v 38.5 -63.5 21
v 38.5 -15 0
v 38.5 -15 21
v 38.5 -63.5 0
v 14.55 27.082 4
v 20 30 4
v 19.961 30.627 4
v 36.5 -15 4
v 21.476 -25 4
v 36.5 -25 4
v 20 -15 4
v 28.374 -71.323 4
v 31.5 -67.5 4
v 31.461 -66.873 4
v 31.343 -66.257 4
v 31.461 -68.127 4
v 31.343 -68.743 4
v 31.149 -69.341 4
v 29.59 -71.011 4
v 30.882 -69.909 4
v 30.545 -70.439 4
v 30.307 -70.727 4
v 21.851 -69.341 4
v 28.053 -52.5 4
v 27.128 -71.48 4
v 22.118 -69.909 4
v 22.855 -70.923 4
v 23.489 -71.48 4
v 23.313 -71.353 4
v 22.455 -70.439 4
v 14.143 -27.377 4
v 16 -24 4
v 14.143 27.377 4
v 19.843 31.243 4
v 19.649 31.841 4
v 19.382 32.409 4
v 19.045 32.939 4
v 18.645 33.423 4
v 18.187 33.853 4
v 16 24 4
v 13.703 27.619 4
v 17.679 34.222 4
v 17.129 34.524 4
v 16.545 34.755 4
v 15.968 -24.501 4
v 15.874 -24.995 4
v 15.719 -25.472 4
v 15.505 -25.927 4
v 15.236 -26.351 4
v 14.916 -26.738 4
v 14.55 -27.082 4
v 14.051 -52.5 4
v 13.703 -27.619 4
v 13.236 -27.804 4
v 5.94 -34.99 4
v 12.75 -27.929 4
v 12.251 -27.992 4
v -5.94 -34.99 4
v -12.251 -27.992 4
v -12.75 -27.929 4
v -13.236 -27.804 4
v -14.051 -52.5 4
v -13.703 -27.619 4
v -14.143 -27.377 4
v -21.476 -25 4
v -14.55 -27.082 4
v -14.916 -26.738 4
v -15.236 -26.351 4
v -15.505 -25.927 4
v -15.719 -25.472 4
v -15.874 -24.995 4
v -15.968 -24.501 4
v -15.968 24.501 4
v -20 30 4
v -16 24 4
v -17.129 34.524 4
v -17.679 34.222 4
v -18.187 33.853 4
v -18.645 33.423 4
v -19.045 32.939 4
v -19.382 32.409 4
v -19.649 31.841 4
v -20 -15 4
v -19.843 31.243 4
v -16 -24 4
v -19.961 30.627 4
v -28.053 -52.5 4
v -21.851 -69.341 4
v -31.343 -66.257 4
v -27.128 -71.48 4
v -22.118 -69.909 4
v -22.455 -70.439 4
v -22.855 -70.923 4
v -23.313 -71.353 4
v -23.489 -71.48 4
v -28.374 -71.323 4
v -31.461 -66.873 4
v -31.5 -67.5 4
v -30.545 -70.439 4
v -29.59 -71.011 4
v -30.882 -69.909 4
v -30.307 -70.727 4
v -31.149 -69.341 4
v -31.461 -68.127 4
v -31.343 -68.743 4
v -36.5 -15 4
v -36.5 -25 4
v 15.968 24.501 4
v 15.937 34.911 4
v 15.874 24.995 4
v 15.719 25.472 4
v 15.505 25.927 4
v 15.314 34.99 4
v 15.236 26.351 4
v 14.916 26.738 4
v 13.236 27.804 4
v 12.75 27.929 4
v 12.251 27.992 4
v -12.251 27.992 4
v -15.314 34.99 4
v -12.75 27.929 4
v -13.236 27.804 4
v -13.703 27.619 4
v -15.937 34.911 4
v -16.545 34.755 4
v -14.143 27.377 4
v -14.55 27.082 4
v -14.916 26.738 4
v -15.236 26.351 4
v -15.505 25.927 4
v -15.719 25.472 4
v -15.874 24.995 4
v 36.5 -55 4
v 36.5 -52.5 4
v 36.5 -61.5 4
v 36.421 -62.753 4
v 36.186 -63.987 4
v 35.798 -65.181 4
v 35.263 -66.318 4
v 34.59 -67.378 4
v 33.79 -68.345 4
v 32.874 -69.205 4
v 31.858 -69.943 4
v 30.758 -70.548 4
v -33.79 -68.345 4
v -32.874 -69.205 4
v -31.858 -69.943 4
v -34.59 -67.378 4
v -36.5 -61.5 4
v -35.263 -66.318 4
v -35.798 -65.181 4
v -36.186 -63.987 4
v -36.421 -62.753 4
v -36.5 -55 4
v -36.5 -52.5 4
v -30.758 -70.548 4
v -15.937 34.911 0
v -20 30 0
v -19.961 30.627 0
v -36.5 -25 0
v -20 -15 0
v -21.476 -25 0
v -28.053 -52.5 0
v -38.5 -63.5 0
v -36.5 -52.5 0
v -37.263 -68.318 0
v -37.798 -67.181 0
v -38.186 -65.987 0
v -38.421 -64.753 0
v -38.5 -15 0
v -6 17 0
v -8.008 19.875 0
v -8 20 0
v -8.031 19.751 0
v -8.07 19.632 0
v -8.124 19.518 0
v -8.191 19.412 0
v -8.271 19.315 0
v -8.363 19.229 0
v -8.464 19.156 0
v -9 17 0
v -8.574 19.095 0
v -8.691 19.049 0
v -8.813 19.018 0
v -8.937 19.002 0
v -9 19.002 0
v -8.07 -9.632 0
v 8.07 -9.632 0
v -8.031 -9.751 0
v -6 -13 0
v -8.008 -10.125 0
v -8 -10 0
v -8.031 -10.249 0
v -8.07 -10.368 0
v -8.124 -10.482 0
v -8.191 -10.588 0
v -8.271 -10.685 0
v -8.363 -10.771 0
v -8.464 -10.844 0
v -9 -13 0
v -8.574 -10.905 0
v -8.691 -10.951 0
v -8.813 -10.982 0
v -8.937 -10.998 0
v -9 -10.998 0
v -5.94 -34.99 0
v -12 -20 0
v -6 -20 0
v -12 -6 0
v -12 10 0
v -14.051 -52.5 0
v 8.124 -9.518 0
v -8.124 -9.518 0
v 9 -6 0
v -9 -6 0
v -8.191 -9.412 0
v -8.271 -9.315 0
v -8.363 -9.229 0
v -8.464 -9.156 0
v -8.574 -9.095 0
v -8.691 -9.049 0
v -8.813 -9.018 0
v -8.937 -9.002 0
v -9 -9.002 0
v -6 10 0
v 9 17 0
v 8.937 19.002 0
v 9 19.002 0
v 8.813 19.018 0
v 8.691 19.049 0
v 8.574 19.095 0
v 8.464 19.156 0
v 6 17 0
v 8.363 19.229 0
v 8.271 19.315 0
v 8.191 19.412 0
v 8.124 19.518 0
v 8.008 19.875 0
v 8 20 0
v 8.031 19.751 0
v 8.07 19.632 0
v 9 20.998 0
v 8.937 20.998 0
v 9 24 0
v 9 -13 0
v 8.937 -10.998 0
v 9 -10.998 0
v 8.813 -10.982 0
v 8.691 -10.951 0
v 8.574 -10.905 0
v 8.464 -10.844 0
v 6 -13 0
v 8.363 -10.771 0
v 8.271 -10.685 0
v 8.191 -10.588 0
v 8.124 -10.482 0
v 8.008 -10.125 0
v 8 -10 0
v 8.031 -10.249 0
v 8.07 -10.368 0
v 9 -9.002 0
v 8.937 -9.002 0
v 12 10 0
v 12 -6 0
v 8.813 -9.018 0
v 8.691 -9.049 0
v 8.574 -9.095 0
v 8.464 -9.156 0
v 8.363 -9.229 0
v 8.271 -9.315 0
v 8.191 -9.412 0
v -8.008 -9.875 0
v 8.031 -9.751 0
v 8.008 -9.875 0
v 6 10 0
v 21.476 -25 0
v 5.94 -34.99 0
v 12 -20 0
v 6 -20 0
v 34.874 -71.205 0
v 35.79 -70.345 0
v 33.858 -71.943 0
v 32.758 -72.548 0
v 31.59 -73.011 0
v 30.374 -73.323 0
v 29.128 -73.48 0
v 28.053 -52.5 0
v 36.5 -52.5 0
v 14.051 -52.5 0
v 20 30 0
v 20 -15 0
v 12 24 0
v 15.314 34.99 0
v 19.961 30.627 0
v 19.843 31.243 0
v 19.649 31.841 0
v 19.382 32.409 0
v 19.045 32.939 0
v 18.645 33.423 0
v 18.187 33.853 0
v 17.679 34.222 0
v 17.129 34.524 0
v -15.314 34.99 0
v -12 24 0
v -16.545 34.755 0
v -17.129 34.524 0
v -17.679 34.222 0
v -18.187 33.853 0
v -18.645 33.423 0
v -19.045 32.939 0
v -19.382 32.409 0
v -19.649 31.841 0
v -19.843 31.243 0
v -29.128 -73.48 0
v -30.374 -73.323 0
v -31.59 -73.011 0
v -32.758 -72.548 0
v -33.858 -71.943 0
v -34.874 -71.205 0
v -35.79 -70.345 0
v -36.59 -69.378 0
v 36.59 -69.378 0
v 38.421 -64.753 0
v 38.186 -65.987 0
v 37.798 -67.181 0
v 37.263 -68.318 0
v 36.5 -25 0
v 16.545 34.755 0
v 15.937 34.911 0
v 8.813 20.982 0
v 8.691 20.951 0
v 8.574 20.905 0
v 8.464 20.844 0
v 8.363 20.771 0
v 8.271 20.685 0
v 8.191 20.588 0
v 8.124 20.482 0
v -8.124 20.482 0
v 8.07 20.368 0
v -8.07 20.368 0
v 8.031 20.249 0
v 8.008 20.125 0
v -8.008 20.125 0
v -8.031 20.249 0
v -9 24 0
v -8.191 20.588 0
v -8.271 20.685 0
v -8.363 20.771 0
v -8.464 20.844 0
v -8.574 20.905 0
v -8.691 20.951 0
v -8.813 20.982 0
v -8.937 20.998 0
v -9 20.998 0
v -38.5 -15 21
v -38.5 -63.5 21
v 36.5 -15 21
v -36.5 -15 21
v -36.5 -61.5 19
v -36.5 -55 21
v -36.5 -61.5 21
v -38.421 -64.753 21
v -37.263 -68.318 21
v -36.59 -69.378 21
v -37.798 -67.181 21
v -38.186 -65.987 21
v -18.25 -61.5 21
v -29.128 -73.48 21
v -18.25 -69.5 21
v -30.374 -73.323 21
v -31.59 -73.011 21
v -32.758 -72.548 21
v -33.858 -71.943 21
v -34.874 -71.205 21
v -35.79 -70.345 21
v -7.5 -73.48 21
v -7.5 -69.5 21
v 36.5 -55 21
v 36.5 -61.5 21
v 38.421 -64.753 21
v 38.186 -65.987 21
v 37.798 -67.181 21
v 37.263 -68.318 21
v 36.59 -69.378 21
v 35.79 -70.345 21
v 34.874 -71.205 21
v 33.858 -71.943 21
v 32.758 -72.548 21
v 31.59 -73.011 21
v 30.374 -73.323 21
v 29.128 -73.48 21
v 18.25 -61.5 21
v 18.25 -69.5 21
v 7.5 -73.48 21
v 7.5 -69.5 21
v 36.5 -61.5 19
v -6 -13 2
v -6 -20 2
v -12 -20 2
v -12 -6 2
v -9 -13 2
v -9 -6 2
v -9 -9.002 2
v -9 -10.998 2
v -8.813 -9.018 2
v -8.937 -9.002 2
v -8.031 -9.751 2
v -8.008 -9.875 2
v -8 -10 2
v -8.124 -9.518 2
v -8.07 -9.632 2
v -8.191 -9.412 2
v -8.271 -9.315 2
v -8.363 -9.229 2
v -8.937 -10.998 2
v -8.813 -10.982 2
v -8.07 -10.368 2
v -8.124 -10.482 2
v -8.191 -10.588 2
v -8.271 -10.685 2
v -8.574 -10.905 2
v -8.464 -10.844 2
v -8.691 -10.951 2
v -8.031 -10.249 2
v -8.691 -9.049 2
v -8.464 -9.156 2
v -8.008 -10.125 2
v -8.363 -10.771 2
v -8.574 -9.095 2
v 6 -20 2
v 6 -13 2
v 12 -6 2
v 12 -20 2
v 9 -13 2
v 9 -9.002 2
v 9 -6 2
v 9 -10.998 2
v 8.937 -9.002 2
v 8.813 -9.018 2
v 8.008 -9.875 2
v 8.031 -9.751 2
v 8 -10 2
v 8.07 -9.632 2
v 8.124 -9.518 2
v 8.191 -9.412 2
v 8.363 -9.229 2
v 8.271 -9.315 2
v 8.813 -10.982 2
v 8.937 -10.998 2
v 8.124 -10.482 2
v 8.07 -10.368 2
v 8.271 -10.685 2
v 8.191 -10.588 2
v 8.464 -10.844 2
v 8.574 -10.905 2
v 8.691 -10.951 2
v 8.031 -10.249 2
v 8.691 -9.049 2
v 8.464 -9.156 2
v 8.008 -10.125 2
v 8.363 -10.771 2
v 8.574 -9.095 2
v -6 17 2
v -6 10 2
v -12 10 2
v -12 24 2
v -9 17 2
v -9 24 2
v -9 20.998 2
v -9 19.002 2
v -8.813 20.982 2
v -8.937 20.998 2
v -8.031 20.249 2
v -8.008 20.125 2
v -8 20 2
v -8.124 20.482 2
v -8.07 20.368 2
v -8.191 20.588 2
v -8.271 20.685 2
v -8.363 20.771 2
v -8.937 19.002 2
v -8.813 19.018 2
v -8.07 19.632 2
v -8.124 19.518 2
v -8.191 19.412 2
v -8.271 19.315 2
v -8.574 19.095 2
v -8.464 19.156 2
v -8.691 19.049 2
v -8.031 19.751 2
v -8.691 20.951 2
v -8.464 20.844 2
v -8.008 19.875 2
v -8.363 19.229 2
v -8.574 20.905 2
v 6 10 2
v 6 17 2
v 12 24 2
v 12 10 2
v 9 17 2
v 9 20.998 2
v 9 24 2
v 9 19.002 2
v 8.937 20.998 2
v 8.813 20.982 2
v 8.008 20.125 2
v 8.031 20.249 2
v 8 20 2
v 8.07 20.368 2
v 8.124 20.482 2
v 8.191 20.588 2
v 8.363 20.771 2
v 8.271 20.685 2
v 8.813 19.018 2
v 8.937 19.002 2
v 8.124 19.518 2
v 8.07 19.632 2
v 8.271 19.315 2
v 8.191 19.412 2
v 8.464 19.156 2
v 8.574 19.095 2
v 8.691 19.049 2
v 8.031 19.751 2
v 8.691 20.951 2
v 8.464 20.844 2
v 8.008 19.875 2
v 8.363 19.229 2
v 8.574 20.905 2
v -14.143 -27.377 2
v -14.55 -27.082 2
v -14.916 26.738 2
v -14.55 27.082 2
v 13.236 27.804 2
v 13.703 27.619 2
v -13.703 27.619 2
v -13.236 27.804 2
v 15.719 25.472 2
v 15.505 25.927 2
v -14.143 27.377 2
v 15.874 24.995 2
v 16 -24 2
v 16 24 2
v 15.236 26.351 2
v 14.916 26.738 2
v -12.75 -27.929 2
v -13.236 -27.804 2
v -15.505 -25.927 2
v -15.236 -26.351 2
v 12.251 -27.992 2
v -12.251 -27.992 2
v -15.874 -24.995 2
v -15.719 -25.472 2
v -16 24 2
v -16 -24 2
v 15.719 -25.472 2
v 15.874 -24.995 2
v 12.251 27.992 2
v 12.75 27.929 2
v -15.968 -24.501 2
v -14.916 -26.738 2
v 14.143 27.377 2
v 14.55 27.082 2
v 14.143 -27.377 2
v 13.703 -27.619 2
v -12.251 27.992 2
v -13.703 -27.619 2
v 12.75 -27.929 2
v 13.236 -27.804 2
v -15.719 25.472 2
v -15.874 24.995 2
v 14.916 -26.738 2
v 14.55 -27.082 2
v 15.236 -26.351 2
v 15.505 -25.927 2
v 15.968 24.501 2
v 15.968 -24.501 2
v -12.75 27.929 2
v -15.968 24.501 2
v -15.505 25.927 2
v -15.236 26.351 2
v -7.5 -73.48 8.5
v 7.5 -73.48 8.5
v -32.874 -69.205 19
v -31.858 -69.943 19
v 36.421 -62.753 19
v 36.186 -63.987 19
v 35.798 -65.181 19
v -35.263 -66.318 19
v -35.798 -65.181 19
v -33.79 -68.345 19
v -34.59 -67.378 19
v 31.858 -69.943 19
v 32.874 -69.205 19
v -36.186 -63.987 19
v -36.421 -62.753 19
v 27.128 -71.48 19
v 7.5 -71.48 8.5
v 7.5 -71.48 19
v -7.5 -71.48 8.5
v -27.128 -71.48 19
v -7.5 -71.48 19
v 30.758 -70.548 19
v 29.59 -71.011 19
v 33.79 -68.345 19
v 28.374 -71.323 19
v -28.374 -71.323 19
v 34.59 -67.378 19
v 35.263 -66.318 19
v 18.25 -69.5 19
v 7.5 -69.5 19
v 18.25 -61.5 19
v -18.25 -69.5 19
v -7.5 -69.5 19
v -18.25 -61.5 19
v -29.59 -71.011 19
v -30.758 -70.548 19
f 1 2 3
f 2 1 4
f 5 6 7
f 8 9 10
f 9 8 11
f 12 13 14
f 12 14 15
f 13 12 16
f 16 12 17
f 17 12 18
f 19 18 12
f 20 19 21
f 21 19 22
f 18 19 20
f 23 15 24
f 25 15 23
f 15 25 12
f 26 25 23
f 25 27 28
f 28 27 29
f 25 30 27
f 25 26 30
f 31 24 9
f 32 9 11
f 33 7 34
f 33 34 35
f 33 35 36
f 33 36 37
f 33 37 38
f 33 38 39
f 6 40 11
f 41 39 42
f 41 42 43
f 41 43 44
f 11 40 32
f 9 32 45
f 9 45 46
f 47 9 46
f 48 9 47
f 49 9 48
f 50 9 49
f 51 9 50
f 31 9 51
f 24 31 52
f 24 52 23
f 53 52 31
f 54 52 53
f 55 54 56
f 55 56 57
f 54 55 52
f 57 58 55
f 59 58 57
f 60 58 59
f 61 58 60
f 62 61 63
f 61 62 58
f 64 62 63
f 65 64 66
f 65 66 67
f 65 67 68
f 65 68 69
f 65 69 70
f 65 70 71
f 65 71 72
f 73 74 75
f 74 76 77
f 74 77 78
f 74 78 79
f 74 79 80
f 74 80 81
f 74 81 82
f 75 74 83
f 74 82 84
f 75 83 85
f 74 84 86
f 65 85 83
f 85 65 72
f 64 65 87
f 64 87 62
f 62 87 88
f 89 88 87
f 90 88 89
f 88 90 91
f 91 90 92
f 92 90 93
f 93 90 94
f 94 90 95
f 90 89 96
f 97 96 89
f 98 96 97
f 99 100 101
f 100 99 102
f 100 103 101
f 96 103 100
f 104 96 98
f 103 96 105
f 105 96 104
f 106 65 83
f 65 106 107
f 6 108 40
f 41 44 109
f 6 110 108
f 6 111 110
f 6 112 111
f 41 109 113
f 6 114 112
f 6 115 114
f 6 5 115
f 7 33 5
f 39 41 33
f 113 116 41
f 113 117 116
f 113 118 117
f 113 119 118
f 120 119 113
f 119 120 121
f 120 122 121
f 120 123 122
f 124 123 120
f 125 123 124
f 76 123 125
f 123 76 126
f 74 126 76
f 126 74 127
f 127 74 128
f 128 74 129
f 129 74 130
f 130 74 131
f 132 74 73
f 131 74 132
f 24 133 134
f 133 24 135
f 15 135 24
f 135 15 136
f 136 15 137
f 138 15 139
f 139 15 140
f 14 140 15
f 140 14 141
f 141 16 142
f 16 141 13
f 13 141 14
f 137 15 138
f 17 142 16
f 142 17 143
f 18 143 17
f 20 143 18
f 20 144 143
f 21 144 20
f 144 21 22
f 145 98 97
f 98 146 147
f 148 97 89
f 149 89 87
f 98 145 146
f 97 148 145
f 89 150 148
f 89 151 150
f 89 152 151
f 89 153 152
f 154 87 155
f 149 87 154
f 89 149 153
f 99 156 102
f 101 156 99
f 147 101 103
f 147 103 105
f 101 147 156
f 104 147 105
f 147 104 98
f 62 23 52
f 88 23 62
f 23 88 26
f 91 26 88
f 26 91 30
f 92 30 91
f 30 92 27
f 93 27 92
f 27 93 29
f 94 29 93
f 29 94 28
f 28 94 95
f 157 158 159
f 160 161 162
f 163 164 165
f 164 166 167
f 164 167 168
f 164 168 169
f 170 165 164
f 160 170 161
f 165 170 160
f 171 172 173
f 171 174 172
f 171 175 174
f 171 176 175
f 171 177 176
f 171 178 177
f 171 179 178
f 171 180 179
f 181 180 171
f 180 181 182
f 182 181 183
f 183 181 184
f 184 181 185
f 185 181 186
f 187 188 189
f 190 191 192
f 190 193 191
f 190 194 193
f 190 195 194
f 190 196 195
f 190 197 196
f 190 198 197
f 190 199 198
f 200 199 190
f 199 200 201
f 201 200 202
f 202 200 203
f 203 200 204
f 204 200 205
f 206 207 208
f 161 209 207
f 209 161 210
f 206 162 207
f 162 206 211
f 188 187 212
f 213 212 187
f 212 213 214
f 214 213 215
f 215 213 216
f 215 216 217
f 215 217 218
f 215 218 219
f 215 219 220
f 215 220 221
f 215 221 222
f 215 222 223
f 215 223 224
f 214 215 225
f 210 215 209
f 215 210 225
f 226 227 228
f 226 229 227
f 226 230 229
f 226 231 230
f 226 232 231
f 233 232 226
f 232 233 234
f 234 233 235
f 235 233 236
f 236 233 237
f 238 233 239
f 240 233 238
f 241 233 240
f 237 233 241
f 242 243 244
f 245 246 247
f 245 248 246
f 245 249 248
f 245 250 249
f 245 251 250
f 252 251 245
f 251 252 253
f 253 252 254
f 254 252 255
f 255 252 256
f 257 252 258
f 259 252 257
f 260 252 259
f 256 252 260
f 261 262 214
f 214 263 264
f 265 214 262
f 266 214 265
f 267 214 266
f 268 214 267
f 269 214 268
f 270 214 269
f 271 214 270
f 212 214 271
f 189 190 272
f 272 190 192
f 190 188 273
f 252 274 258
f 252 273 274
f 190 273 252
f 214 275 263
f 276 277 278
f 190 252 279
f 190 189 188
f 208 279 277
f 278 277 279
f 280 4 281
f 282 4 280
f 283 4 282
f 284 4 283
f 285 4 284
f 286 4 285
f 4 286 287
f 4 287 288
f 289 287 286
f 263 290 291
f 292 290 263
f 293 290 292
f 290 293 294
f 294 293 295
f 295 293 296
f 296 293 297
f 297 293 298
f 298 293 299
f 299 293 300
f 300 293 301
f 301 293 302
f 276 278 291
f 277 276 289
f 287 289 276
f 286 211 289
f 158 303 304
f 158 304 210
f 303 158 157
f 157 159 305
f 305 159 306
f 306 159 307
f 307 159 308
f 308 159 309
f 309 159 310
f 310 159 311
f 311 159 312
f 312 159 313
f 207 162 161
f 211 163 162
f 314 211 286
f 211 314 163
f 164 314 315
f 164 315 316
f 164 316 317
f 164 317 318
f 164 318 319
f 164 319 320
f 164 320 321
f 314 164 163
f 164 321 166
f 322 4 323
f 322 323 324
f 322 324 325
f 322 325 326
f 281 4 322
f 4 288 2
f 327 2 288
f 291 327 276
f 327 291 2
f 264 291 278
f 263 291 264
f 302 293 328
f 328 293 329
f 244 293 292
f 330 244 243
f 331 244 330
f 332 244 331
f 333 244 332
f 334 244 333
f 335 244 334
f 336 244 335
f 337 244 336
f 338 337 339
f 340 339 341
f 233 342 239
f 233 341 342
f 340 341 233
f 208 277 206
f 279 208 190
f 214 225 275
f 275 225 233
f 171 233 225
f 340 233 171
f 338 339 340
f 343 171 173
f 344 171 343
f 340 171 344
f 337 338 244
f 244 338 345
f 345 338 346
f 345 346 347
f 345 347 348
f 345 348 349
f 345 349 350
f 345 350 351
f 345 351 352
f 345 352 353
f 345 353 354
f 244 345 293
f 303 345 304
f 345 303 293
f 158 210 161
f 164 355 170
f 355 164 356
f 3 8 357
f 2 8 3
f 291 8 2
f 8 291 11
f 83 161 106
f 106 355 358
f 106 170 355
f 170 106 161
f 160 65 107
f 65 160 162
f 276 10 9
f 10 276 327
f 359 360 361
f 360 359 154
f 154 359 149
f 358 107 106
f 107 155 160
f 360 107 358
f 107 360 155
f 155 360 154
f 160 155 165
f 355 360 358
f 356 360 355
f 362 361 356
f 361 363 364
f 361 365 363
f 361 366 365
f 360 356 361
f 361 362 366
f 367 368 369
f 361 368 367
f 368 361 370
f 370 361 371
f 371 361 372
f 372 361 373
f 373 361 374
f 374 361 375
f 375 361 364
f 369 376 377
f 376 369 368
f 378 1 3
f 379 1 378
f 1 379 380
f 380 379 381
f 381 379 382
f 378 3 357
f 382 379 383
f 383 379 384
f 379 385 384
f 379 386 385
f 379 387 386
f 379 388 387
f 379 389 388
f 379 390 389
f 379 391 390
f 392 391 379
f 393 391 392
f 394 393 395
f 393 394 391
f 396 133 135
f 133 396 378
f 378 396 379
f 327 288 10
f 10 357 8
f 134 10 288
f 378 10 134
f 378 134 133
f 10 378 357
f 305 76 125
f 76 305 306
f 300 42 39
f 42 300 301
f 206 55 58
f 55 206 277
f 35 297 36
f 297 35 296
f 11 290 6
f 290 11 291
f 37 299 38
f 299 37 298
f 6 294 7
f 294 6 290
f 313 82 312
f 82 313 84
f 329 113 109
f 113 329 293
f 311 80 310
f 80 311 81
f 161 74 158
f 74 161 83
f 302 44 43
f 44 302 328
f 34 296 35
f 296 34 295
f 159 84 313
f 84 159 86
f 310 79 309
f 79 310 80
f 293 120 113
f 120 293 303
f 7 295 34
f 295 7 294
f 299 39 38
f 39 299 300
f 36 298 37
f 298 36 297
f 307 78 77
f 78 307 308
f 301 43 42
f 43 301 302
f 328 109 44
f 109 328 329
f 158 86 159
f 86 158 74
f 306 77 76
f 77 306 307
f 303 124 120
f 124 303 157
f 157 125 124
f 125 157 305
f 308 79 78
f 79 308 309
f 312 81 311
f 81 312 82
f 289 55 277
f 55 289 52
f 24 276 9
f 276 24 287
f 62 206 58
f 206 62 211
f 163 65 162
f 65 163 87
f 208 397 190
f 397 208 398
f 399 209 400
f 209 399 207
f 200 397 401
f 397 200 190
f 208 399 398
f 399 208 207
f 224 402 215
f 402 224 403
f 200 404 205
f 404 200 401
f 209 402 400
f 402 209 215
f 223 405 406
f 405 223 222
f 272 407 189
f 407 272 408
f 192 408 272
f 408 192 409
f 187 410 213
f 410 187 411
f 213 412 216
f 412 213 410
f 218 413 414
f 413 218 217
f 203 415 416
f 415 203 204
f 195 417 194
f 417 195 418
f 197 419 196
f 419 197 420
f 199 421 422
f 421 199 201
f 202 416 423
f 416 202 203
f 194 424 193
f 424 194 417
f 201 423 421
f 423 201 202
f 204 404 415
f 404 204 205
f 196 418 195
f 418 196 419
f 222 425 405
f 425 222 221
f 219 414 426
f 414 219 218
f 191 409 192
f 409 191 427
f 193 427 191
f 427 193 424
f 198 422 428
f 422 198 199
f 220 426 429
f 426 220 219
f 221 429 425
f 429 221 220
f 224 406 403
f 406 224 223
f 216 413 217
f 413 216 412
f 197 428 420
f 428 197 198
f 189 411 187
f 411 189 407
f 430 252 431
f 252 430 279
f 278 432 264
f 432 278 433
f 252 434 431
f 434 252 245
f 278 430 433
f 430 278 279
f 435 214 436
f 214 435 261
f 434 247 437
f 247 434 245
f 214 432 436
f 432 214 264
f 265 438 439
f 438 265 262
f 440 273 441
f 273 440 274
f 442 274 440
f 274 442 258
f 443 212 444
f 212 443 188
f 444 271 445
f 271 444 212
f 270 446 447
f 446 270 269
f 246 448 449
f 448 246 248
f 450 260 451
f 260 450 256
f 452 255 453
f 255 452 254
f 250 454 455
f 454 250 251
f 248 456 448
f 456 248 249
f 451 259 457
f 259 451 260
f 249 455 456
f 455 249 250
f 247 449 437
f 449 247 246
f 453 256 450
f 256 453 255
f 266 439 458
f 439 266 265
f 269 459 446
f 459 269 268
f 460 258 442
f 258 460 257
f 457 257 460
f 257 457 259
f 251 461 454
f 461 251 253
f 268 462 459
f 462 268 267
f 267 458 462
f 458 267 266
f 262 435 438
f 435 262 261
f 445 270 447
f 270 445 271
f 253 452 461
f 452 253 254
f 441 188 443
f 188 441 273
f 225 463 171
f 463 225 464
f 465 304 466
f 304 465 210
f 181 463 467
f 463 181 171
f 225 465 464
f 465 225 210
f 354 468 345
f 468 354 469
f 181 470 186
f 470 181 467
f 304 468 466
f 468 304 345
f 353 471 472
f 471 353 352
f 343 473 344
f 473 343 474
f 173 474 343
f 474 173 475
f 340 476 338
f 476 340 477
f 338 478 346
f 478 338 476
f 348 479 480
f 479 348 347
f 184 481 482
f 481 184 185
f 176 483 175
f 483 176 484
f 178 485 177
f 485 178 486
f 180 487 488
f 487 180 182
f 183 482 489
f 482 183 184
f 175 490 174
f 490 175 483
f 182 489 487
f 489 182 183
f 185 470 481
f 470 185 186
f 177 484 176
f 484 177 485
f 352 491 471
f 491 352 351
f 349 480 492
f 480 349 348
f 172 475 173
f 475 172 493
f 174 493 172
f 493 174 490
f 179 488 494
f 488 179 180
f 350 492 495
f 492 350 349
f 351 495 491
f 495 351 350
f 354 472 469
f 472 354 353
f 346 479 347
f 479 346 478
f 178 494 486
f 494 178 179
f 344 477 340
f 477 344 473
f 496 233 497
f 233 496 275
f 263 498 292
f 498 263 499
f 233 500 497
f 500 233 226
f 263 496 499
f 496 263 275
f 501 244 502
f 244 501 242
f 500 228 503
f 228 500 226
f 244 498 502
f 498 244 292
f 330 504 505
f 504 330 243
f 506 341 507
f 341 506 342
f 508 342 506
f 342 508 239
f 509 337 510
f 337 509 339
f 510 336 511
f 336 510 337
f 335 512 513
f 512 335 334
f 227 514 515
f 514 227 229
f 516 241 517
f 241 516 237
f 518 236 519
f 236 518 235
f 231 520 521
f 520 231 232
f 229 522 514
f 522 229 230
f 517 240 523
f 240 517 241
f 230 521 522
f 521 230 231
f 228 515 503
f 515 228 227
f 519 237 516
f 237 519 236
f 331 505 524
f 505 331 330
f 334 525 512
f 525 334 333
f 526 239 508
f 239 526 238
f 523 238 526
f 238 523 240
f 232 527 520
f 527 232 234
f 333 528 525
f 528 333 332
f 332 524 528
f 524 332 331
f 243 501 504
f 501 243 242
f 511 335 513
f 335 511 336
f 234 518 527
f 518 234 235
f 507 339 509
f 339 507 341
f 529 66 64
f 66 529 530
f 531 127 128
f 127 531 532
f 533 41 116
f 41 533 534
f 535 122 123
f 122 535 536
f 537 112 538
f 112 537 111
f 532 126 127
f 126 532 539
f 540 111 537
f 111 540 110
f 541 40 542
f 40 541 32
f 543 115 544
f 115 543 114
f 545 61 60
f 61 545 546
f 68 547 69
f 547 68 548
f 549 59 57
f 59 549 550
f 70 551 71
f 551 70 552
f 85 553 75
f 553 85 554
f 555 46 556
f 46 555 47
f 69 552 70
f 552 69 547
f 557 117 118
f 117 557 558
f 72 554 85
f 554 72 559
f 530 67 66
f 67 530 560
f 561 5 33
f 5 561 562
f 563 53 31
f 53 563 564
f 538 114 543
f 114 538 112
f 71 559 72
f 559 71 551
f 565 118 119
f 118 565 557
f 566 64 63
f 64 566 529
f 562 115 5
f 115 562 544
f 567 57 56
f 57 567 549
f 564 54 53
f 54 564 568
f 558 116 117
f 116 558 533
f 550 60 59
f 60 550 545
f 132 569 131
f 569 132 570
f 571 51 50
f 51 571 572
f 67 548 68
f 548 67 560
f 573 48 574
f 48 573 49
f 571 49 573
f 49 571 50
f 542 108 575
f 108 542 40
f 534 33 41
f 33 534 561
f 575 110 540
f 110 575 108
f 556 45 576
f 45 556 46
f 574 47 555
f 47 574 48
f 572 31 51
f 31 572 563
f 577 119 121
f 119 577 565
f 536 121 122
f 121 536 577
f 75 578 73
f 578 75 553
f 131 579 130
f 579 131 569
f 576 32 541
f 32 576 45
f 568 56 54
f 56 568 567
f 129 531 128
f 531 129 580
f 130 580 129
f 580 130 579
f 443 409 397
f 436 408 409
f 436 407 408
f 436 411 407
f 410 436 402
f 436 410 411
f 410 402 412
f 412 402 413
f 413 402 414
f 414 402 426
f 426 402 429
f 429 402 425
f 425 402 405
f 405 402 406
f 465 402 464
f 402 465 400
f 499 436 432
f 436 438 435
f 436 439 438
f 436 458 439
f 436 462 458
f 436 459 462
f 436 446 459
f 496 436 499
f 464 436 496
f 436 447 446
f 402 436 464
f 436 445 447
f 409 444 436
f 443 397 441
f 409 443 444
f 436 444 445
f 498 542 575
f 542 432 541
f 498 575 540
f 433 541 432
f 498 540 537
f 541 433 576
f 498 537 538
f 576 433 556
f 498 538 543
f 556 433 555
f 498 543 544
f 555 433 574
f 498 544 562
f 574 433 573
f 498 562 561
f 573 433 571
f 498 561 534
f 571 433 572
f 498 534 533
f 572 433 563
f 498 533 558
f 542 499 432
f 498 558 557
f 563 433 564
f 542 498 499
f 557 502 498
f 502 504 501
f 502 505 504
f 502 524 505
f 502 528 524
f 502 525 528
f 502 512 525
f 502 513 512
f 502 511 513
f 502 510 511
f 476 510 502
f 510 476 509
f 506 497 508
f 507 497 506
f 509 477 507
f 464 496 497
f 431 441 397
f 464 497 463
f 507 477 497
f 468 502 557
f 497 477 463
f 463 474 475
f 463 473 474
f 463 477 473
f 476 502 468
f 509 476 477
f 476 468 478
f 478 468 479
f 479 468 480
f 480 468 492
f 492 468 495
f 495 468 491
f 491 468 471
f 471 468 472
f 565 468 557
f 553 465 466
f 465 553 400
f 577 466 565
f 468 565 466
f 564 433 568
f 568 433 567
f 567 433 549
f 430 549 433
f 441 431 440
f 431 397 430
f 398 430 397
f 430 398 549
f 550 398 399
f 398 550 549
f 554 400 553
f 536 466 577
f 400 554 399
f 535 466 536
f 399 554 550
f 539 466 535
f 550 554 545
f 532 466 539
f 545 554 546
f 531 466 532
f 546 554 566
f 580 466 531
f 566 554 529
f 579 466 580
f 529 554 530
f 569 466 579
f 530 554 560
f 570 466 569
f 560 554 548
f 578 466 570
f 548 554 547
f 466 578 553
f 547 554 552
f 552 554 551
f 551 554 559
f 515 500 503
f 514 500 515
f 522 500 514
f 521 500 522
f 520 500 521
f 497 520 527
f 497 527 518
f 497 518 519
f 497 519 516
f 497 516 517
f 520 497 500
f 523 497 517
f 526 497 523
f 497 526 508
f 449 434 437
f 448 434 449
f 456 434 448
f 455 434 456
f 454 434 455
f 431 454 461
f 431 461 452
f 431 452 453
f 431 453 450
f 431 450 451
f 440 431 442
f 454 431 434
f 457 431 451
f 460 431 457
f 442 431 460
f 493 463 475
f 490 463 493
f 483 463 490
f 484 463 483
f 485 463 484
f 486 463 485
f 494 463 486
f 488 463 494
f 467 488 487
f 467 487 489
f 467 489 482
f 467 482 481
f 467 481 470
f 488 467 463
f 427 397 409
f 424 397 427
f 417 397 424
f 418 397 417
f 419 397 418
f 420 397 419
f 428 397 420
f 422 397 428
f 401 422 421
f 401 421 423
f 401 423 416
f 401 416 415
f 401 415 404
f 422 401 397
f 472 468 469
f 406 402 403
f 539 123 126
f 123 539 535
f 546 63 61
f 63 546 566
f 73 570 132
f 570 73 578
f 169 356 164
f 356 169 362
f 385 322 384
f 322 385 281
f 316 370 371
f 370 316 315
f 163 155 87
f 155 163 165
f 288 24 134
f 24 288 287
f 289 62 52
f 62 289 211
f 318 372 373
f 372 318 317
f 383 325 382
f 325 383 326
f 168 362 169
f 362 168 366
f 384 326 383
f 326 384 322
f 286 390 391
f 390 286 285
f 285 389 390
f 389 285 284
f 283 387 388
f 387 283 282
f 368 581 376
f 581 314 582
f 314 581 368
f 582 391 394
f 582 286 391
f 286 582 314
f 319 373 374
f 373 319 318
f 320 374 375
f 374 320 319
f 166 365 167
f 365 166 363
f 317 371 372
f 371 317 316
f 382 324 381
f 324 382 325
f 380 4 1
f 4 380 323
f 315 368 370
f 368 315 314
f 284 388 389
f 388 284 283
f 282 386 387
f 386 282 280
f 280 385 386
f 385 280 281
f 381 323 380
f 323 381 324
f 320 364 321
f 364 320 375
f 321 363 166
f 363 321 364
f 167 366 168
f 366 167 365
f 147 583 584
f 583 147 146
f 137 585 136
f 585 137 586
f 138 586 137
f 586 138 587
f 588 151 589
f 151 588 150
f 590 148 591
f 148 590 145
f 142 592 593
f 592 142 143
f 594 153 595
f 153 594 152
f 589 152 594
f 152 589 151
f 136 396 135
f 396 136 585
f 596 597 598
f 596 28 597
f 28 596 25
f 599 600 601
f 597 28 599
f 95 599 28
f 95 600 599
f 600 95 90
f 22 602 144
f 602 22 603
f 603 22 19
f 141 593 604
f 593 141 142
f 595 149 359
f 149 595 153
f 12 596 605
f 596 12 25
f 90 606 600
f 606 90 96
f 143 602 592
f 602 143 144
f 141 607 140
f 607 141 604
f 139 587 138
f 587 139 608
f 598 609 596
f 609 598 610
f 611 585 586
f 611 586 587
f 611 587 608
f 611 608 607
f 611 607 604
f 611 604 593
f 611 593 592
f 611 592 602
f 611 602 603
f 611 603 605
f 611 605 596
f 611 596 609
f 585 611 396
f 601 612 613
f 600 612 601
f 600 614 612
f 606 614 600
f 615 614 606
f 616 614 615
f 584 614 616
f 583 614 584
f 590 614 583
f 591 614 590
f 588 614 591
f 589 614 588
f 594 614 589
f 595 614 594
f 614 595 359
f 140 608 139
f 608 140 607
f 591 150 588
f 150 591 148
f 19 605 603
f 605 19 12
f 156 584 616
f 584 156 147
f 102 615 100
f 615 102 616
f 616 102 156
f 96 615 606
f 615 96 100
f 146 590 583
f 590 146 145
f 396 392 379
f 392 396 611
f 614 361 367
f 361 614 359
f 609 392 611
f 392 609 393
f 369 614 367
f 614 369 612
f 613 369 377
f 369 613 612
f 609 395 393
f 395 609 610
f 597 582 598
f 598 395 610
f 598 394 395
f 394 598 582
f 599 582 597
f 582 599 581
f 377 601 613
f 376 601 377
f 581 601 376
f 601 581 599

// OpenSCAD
phone_width = 73;
phone_length = 143;
phone_height = 15;
radius_phone = 10;

/* [Hidden] */
height = 4;
radius = 5;

$fn=50;

//phone();

difference() {
    union() {
        difference() {
            base_plate();
        }
        lower_connector();
        mirror([1,0,0]) lower_connector();
        // No upper connector
        //upper_connector();
        middle_part();
    }
    translate([0,0,height-2]) scale([0.8,0.8,1]) base_plate(); 
    mount_grid();
}

lower_part();
// No upper part
//upper_part();


module phone() {    
    color("blue", 0.2) hull() {
        translate([phone_width/2-radius_phone, phone_length/2-radius_phone, height]) cylinder(r=radius_phone,h=phone_height);
        translate([phone_width/2-radius_phone, -phone_length/2+radius_phone, height]) cylinder(r=radius_phone,h=phone_height);
        translate([-phone_width/2+radius_phone, phone_length/2-radius_phone, height]) cylinder(r=radius_phone,h=phone_height);
        translate([-phone_width/2+radius_phone, -phone_length/2+radius_phone, height]) cylinder(r=radius_phone,h=phone_height);
    }
}

module base_plate() {
    hull() {
        translate([15, 30, 0]) cylinder(r=radius,h=height);
        translate([15, -30, 0]) cylinder(r=radius,h=height);
        translate([-15, 30, 0]) cylinder(r=radius,h=height);
        translate([-15, -30, 0]) cylinder(r=radius,h=height);
    }
}

module upper_connector() {
    hull() {
        translate([0, 20, height/2]) cube([4*radius, 4*radius, height], center = true);
        translate([0, phone_length/2, height/2]) cube([2*radius, 2*radius, height], center = true);
    }
}

module upper_part() {
    translate([0, phone_length/2+radius, 1]) rotate([0,90,0]) {
        hull() {
            cylinder(r=1,h=2*radius, center=true);
            translate([-phone_height+2, 0, 0]) cylinder(r=0.5,h=2*radius, center=true);
        }        
        translate([-phone_height-4, 0, 0]) difference() {
            cylinder(r=6, h=2*radius, center=true);
            cylinder(r=5, h=2*radius, center=true);
            translate([-10,0.5,-10]) cube([20, 10, 20]);
            translate([-15,-12,-10]) rotate([0,0,45]) cube([20, 10, 20]);
        }
        #translate([-phone_height-12,-5.5,-radius]) rotate([0,0,45])  cube([radius, 1, 2*radius]);
    }
}

module lower_connector() {
    hull() {
        translate([10, -20, 0]) cylinder(r=2*radius,h=height);
        translate([phone_width/2-10, -phone_length/2+4, 0]) cylinder(r=radius,h=height);
    }
    // No rotation of lower part
    //translate([phone_width/2-10, -phone_length/2+4, 0]) cylinder(r=radius,h=7);
}

module lower_part() {
    // No rotation of lower part
    rotate([/*-5*/0,0,0]) difference() {
        hull() {
            translate([0, -phone_length/2+18, (phone_height + 2+height)/2]) cube([phone_width + 4, 2, phone_height + 2+height], center=true);
            translate([-phone_width/2+radius+3, -phone_length/2+radius_phone - 2, 0]) cylinder(r=radius_phone,h=phone_height + 2+height);
            translate([phone_width/2-radius-3, -phone_length/2+radius_phone - 2, 0]) cylinder(r=radius_phone,h=phone_height + 2+height);
        }
        phone();
        // cut out for display
        translate([0,10,20]) cube([phone_width, phone_length, phone_height], center=true);
        // cut out for microphone
        translate([0,2,20]) cube([phone_width/2, phone_length, phone_height], center=true);
        // cut out for charger
        translate([0,-12,16]) cube([15, phone_length, phone_height], center=true);
    }
}

module middle_part() {
    translate([0,-20,height/2]) {
        cube([phone_width+4, 10, height], center = true);
        translate([-phone_width/2-2,-35,-height/2]) cube([2, 40, phone_height + 2+height]);
        translate([phone_width/2,-35,-height/2]) cube([2, 40, phone_height + 2+height]);
    }
}

module mount_grid() {
    translate([-10.5, -20, 0]) mount_grid_module();
    translate([10.5, -20, 0]) mirror([180,0,0]) mount_grid_module();
    translate([-10.5, 10, 0]) mount_grid_module();
    translate([10.5, 10, 0]) mirror([180,0,0]) mount_grid_module();
}

module mount_grid_module() {    
    translate([-1.5, 0, -10]) cube([6, 7, 20]);
    translate([-1.5, 7, -10]) cube([3, 7, 20]);
    translate([1.5, 10, -10]) cylinder(r=1,h=20);
}
